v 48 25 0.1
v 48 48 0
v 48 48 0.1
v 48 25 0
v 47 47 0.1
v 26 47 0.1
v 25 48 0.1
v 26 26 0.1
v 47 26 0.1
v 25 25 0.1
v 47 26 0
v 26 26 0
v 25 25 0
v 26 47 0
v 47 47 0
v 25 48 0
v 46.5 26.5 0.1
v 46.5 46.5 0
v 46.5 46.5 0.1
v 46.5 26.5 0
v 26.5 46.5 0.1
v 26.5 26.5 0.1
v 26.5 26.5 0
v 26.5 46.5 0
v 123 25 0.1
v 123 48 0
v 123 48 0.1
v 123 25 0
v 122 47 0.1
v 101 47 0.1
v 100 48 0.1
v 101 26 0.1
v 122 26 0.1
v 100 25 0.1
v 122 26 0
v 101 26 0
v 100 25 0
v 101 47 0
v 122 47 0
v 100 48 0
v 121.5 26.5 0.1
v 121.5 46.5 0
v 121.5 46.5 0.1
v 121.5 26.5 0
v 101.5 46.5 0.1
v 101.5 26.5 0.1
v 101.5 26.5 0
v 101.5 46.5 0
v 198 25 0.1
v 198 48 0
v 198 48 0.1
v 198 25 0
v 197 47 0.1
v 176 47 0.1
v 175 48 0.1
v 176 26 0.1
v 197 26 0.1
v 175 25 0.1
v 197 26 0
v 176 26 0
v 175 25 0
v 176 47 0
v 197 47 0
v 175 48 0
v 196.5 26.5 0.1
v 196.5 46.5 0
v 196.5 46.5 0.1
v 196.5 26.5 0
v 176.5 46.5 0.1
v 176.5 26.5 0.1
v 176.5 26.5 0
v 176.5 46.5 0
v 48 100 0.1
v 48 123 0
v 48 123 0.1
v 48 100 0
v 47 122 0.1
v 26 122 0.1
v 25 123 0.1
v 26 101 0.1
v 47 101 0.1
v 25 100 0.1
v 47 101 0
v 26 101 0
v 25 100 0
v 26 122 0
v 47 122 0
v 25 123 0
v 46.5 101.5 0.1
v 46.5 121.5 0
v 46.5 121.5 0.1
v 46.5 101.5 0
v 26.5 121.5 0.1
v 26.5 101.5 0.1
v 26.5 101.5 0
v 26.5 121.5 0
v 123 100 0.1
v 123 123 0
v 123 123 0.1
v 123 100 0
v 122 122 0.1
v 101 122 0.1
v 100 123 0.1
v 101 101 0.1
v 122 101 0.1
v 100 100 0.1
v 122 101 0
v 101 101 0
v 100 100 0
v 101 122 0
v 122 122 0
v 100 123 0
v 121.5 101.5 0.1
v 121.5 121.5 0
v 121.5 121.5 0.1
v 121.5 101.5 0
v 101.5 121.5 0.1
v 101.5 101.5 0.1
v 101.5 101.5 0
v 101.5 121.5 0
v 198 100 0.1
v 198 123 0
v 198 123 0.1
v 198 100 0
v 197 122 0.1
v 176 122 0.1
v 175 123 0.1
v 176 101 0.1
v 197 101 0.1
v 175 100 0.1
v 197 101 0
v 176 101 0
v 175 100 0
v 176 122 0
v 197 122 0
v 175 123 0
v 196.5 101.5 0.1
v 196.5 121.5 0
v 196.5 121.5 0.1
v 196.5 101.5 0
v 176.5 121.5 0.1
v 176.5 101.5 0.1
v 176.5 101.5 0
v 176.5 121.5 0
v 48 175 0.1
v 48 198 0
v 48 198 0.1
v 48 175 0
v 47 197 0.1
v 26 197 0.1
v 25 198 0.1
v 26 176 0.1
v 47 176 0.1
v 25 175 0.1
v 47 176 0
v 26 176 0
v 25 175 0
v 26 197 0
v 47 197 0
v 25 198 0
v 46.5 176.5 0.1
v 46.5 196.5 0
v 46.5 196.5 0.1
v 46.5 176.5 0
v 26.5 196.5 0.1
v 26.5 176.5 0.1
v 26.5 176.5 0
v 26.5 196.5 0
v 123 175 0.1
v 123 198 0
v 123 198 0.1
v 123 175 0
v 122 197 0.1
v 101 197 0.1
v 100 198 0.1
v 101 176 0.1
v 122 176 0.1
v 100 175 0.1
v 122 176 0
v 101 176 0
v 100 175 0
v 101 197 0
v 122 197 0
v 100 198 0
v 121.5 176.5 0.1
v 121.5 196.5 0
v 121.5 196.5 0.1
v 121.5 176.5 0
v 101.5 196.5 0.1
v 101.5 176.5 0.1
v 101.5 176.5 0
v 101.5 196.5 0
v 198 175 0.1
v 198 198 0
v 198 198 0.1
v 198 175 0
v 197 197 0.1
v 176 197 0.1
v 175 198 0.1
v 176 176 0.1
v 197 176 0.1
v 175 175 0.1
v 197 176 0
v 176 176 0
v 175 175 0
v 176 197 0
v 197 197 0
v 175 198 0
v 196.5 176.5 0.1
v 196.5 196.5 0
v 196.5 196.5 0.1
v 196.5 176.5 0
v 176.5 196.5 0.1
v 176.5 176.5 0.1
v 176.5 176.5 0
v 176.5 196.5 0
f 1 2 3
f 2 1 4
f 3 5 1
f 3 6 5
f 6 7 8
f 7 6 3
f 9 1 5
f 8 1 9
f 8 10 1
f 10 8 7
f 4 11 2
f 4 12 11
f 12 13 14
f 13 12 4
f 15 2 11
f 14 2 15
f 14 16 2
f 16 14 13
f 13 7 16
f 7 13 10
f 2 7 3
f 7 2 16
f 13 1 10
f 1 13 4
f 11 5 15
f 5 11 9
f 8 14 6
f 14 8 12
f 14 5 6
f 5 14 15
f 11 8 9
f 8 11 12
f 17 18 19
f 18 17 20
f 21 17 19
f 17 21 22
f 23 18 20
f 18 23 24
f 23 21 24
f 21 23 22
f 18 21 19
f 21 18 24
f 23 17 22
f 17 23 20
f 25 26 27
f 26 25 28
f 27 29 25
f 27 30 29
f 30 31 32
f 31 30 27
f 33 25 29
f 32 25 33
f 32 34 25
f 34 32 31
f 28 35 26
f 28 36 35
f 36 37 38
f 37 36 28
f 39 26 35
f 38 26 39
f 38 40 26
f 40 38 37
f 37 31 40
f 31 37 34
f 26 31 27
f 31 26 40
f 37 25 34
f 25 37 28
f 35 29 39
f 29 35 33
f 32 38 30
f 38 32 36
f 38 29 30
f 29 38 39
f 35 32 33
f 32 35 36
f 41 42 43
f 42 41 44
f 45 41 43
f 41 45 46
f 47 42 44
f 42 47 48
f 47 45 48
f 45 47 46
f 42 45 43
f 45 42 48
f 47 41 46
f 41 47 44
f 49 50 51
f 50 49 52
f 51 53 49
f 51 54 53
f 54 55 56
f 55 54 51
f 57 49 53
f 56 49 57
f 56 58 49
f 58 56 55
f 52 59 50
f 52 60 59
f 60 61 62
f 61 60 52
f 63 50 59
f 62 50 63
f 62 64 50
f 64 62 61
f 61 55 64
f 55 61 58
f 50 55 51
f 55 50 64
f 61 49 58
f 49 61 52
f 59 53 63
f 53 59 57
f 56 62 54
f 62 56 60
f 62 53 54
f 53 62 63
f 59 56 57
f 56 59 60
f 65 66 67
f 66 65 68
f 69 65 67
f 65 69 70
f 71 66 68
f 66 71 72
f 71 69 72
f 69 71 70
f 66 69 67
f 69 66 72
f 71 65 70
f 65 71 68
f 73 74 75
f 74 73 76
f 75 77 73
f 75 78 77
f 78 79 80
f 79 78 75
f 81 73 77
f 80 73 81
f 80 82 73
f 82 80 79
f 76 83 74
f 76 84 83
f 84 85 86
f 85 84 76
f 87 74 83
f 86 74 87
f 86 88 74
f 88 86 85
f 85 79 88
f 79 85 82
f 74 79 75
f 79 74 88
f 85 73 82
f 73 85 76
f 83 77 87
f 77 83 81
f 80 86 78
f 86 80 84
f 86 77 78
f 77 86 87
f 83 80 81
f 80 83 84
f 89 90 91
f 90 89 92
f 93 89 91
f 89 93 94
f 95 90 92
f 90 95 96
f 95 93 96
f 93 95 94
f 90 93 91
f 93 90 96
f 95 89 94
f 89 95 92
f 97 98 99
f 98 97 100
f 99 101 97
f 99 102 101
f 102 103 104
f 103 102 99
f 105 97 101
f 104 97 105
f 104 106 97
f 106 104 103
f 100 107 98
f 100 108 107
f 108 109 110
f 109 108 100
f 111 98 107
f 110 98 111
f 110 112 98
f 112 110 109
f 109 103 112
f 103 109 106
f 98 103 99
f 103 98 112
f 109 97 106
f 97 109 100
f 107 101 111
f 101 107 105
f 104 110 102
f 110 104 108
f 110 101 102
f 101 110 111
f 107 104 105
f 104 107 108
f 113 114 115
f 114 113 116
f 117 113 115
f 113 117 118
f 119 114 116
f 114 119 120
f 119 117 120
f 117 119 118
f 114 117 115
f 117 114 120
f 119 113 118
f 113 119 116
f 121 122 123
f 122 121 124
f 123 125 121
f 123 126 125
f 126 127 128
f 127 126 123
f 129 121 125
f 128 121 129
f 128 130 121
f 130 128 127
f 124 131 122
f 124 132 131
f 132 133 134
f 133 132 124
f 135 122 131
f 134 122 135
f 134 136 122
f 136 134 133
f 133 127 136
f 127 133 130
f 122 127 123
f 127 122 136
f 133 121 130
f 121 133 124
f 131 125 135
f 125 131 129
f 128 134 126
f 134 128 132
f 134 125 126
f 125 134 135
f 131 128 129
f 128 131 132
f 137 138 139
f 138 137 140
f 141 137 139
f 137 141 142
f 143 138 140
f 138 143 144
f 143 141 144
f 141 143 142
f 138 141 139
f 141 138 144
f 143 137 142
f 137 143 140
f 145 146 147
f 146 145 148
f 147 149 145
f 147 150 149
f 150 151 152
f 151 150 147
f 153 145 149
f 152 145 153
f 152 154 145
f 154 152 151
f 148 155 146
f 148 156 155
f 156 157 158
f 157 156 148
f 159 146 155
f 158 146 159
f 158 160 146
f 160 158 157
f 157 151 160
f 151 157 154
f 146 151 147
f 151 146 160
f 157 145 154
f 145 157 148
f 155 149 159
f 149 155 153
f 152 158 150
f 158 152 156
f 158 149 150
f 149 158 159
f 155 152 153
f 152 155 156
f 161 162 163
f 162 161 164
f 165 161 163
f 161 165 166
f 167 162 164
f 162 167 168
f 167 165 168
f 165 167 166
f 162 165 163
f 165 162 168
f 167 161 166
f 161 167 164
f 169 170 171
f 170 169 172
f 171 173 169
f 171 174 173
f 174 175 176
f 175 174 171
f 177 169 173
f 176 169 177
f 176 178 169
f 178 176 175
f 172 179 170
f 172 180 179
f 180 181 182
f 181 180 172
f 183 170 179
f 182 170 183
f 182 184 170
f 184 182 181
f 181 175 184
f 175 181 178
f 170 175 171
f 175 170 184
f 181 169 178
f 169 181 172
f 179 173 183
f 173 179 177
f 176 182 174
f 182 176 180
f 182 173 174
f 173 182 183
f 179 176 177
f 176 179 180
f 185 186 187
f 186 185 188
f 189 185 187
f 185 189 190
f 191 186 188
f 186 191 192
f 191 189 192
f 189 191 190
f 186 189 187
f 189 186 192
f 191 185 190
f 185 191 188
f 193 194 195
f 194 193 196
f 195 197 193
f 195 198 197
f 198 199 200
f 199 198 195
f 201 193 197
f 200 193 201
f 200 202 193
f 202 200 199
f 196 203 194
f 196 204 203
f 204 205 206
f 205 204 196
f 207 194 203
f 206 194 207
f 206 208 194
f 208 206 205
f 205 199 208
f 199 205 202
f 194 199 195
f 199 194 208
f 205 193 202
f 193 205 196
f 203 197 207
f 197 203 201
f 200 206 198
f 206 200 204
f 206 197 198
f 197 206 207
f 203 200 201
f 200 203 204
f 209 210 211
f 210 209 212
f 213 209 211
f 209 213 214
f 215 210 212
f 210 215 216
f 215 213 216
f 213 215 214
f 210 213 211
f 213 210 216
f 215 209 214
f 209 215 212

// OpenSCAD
// This script is just https://www.thingiverse.com/thing:34558
// reformatted to be more customizer-friendly

/**
 * Print designed to check that you bed is level
 *
 * print four small squares in each corner to ensure even print quality and good adhesion.
 */

// Define your printers printable area
// If you are using Sprinter firmware then these come directly from configuration.h

/* [Printer] */

// Width of the bed, in mm
X_MAX_LENGTH = 220;

// Depth of the bed, in mm
Y_MAX_LENGTH = 220;

/* [Squares] */

// Square / outline thickness, in mm
THICKNESS = 0.1;

// Square width / height, in mm
SIZE = 20;

// Width of border between square and parameter, in mm
GAP = 0.5;

// Width of parameter around square, in mm
OUTLINE_WIDTH = 1;

// Offset from limits in each axis, in mm
OFFSET = 25; 

translate([OFFSET, OFFSET, 0]) square(); //Top Left
translate([(X_MAX_LENGTH / 2) - (SIZE / 2), OFFSET, 0]) square(); //Top Middle
translate([X_MAX_LENGTH - OFFSET - SIZE, OFFSET, 0]) square(); //Top Right

translate([OFFSET, (Y_MAX_LENGTH / 2) - (SIZE / 2), 0]) square(); //Middle Left
translate([(X_MAX_LENGTH / 2) - (SIZE / 2), (Y_MAX_LENGTH / 2) - (SIZE / 2), 0]) square(); //Middle Middle
translate([X_MAX_LENGTH - OFFSET - SIZE, (Y_MAX_LENGTH / 2) - (SIZE / 2), 0]) square(); //Middle Right

translate([OFFSET, Y_MAX_LENGTH - OFFSET - SIZE, 0]) square(); //Bottom Left
translate([(X_MAX_LENGTH / 2) - (SIZE / 2), Y_MAX_LENGTH - OFFSET - SIZE, 0]) square(); //Bottom Middle
translate([X_MAX_LENGTH - OFFSET - SIZE, Y_MAX_LENGTH - OFFSET - SIZE, 0]) square(); //Bottom Right

module square() {
	//Center square
	translate([
				OUTLINE_WIDTH + GAP,
				OUTLINE_WIDTH + GAP,
				0
			])
		cube([SIZE, SIZE, THICKNESS]);

	//Parameter
	difference() {
		//Outer square
		cube([
				SIZE + (2 * (GAP + OUTLINE_WIDTH)),
				SIZE + (2 * (GAP + OUTLINE_WIDTH)),
				THICKNESS
			]);

		//Inner square
		translate([OUTLINE_WIDTH, OUTLINE_WIDTH, -5])
			cube([SIZE + (2 * GAP), SIZE + (2 * GAP), 10]);
	}
}
